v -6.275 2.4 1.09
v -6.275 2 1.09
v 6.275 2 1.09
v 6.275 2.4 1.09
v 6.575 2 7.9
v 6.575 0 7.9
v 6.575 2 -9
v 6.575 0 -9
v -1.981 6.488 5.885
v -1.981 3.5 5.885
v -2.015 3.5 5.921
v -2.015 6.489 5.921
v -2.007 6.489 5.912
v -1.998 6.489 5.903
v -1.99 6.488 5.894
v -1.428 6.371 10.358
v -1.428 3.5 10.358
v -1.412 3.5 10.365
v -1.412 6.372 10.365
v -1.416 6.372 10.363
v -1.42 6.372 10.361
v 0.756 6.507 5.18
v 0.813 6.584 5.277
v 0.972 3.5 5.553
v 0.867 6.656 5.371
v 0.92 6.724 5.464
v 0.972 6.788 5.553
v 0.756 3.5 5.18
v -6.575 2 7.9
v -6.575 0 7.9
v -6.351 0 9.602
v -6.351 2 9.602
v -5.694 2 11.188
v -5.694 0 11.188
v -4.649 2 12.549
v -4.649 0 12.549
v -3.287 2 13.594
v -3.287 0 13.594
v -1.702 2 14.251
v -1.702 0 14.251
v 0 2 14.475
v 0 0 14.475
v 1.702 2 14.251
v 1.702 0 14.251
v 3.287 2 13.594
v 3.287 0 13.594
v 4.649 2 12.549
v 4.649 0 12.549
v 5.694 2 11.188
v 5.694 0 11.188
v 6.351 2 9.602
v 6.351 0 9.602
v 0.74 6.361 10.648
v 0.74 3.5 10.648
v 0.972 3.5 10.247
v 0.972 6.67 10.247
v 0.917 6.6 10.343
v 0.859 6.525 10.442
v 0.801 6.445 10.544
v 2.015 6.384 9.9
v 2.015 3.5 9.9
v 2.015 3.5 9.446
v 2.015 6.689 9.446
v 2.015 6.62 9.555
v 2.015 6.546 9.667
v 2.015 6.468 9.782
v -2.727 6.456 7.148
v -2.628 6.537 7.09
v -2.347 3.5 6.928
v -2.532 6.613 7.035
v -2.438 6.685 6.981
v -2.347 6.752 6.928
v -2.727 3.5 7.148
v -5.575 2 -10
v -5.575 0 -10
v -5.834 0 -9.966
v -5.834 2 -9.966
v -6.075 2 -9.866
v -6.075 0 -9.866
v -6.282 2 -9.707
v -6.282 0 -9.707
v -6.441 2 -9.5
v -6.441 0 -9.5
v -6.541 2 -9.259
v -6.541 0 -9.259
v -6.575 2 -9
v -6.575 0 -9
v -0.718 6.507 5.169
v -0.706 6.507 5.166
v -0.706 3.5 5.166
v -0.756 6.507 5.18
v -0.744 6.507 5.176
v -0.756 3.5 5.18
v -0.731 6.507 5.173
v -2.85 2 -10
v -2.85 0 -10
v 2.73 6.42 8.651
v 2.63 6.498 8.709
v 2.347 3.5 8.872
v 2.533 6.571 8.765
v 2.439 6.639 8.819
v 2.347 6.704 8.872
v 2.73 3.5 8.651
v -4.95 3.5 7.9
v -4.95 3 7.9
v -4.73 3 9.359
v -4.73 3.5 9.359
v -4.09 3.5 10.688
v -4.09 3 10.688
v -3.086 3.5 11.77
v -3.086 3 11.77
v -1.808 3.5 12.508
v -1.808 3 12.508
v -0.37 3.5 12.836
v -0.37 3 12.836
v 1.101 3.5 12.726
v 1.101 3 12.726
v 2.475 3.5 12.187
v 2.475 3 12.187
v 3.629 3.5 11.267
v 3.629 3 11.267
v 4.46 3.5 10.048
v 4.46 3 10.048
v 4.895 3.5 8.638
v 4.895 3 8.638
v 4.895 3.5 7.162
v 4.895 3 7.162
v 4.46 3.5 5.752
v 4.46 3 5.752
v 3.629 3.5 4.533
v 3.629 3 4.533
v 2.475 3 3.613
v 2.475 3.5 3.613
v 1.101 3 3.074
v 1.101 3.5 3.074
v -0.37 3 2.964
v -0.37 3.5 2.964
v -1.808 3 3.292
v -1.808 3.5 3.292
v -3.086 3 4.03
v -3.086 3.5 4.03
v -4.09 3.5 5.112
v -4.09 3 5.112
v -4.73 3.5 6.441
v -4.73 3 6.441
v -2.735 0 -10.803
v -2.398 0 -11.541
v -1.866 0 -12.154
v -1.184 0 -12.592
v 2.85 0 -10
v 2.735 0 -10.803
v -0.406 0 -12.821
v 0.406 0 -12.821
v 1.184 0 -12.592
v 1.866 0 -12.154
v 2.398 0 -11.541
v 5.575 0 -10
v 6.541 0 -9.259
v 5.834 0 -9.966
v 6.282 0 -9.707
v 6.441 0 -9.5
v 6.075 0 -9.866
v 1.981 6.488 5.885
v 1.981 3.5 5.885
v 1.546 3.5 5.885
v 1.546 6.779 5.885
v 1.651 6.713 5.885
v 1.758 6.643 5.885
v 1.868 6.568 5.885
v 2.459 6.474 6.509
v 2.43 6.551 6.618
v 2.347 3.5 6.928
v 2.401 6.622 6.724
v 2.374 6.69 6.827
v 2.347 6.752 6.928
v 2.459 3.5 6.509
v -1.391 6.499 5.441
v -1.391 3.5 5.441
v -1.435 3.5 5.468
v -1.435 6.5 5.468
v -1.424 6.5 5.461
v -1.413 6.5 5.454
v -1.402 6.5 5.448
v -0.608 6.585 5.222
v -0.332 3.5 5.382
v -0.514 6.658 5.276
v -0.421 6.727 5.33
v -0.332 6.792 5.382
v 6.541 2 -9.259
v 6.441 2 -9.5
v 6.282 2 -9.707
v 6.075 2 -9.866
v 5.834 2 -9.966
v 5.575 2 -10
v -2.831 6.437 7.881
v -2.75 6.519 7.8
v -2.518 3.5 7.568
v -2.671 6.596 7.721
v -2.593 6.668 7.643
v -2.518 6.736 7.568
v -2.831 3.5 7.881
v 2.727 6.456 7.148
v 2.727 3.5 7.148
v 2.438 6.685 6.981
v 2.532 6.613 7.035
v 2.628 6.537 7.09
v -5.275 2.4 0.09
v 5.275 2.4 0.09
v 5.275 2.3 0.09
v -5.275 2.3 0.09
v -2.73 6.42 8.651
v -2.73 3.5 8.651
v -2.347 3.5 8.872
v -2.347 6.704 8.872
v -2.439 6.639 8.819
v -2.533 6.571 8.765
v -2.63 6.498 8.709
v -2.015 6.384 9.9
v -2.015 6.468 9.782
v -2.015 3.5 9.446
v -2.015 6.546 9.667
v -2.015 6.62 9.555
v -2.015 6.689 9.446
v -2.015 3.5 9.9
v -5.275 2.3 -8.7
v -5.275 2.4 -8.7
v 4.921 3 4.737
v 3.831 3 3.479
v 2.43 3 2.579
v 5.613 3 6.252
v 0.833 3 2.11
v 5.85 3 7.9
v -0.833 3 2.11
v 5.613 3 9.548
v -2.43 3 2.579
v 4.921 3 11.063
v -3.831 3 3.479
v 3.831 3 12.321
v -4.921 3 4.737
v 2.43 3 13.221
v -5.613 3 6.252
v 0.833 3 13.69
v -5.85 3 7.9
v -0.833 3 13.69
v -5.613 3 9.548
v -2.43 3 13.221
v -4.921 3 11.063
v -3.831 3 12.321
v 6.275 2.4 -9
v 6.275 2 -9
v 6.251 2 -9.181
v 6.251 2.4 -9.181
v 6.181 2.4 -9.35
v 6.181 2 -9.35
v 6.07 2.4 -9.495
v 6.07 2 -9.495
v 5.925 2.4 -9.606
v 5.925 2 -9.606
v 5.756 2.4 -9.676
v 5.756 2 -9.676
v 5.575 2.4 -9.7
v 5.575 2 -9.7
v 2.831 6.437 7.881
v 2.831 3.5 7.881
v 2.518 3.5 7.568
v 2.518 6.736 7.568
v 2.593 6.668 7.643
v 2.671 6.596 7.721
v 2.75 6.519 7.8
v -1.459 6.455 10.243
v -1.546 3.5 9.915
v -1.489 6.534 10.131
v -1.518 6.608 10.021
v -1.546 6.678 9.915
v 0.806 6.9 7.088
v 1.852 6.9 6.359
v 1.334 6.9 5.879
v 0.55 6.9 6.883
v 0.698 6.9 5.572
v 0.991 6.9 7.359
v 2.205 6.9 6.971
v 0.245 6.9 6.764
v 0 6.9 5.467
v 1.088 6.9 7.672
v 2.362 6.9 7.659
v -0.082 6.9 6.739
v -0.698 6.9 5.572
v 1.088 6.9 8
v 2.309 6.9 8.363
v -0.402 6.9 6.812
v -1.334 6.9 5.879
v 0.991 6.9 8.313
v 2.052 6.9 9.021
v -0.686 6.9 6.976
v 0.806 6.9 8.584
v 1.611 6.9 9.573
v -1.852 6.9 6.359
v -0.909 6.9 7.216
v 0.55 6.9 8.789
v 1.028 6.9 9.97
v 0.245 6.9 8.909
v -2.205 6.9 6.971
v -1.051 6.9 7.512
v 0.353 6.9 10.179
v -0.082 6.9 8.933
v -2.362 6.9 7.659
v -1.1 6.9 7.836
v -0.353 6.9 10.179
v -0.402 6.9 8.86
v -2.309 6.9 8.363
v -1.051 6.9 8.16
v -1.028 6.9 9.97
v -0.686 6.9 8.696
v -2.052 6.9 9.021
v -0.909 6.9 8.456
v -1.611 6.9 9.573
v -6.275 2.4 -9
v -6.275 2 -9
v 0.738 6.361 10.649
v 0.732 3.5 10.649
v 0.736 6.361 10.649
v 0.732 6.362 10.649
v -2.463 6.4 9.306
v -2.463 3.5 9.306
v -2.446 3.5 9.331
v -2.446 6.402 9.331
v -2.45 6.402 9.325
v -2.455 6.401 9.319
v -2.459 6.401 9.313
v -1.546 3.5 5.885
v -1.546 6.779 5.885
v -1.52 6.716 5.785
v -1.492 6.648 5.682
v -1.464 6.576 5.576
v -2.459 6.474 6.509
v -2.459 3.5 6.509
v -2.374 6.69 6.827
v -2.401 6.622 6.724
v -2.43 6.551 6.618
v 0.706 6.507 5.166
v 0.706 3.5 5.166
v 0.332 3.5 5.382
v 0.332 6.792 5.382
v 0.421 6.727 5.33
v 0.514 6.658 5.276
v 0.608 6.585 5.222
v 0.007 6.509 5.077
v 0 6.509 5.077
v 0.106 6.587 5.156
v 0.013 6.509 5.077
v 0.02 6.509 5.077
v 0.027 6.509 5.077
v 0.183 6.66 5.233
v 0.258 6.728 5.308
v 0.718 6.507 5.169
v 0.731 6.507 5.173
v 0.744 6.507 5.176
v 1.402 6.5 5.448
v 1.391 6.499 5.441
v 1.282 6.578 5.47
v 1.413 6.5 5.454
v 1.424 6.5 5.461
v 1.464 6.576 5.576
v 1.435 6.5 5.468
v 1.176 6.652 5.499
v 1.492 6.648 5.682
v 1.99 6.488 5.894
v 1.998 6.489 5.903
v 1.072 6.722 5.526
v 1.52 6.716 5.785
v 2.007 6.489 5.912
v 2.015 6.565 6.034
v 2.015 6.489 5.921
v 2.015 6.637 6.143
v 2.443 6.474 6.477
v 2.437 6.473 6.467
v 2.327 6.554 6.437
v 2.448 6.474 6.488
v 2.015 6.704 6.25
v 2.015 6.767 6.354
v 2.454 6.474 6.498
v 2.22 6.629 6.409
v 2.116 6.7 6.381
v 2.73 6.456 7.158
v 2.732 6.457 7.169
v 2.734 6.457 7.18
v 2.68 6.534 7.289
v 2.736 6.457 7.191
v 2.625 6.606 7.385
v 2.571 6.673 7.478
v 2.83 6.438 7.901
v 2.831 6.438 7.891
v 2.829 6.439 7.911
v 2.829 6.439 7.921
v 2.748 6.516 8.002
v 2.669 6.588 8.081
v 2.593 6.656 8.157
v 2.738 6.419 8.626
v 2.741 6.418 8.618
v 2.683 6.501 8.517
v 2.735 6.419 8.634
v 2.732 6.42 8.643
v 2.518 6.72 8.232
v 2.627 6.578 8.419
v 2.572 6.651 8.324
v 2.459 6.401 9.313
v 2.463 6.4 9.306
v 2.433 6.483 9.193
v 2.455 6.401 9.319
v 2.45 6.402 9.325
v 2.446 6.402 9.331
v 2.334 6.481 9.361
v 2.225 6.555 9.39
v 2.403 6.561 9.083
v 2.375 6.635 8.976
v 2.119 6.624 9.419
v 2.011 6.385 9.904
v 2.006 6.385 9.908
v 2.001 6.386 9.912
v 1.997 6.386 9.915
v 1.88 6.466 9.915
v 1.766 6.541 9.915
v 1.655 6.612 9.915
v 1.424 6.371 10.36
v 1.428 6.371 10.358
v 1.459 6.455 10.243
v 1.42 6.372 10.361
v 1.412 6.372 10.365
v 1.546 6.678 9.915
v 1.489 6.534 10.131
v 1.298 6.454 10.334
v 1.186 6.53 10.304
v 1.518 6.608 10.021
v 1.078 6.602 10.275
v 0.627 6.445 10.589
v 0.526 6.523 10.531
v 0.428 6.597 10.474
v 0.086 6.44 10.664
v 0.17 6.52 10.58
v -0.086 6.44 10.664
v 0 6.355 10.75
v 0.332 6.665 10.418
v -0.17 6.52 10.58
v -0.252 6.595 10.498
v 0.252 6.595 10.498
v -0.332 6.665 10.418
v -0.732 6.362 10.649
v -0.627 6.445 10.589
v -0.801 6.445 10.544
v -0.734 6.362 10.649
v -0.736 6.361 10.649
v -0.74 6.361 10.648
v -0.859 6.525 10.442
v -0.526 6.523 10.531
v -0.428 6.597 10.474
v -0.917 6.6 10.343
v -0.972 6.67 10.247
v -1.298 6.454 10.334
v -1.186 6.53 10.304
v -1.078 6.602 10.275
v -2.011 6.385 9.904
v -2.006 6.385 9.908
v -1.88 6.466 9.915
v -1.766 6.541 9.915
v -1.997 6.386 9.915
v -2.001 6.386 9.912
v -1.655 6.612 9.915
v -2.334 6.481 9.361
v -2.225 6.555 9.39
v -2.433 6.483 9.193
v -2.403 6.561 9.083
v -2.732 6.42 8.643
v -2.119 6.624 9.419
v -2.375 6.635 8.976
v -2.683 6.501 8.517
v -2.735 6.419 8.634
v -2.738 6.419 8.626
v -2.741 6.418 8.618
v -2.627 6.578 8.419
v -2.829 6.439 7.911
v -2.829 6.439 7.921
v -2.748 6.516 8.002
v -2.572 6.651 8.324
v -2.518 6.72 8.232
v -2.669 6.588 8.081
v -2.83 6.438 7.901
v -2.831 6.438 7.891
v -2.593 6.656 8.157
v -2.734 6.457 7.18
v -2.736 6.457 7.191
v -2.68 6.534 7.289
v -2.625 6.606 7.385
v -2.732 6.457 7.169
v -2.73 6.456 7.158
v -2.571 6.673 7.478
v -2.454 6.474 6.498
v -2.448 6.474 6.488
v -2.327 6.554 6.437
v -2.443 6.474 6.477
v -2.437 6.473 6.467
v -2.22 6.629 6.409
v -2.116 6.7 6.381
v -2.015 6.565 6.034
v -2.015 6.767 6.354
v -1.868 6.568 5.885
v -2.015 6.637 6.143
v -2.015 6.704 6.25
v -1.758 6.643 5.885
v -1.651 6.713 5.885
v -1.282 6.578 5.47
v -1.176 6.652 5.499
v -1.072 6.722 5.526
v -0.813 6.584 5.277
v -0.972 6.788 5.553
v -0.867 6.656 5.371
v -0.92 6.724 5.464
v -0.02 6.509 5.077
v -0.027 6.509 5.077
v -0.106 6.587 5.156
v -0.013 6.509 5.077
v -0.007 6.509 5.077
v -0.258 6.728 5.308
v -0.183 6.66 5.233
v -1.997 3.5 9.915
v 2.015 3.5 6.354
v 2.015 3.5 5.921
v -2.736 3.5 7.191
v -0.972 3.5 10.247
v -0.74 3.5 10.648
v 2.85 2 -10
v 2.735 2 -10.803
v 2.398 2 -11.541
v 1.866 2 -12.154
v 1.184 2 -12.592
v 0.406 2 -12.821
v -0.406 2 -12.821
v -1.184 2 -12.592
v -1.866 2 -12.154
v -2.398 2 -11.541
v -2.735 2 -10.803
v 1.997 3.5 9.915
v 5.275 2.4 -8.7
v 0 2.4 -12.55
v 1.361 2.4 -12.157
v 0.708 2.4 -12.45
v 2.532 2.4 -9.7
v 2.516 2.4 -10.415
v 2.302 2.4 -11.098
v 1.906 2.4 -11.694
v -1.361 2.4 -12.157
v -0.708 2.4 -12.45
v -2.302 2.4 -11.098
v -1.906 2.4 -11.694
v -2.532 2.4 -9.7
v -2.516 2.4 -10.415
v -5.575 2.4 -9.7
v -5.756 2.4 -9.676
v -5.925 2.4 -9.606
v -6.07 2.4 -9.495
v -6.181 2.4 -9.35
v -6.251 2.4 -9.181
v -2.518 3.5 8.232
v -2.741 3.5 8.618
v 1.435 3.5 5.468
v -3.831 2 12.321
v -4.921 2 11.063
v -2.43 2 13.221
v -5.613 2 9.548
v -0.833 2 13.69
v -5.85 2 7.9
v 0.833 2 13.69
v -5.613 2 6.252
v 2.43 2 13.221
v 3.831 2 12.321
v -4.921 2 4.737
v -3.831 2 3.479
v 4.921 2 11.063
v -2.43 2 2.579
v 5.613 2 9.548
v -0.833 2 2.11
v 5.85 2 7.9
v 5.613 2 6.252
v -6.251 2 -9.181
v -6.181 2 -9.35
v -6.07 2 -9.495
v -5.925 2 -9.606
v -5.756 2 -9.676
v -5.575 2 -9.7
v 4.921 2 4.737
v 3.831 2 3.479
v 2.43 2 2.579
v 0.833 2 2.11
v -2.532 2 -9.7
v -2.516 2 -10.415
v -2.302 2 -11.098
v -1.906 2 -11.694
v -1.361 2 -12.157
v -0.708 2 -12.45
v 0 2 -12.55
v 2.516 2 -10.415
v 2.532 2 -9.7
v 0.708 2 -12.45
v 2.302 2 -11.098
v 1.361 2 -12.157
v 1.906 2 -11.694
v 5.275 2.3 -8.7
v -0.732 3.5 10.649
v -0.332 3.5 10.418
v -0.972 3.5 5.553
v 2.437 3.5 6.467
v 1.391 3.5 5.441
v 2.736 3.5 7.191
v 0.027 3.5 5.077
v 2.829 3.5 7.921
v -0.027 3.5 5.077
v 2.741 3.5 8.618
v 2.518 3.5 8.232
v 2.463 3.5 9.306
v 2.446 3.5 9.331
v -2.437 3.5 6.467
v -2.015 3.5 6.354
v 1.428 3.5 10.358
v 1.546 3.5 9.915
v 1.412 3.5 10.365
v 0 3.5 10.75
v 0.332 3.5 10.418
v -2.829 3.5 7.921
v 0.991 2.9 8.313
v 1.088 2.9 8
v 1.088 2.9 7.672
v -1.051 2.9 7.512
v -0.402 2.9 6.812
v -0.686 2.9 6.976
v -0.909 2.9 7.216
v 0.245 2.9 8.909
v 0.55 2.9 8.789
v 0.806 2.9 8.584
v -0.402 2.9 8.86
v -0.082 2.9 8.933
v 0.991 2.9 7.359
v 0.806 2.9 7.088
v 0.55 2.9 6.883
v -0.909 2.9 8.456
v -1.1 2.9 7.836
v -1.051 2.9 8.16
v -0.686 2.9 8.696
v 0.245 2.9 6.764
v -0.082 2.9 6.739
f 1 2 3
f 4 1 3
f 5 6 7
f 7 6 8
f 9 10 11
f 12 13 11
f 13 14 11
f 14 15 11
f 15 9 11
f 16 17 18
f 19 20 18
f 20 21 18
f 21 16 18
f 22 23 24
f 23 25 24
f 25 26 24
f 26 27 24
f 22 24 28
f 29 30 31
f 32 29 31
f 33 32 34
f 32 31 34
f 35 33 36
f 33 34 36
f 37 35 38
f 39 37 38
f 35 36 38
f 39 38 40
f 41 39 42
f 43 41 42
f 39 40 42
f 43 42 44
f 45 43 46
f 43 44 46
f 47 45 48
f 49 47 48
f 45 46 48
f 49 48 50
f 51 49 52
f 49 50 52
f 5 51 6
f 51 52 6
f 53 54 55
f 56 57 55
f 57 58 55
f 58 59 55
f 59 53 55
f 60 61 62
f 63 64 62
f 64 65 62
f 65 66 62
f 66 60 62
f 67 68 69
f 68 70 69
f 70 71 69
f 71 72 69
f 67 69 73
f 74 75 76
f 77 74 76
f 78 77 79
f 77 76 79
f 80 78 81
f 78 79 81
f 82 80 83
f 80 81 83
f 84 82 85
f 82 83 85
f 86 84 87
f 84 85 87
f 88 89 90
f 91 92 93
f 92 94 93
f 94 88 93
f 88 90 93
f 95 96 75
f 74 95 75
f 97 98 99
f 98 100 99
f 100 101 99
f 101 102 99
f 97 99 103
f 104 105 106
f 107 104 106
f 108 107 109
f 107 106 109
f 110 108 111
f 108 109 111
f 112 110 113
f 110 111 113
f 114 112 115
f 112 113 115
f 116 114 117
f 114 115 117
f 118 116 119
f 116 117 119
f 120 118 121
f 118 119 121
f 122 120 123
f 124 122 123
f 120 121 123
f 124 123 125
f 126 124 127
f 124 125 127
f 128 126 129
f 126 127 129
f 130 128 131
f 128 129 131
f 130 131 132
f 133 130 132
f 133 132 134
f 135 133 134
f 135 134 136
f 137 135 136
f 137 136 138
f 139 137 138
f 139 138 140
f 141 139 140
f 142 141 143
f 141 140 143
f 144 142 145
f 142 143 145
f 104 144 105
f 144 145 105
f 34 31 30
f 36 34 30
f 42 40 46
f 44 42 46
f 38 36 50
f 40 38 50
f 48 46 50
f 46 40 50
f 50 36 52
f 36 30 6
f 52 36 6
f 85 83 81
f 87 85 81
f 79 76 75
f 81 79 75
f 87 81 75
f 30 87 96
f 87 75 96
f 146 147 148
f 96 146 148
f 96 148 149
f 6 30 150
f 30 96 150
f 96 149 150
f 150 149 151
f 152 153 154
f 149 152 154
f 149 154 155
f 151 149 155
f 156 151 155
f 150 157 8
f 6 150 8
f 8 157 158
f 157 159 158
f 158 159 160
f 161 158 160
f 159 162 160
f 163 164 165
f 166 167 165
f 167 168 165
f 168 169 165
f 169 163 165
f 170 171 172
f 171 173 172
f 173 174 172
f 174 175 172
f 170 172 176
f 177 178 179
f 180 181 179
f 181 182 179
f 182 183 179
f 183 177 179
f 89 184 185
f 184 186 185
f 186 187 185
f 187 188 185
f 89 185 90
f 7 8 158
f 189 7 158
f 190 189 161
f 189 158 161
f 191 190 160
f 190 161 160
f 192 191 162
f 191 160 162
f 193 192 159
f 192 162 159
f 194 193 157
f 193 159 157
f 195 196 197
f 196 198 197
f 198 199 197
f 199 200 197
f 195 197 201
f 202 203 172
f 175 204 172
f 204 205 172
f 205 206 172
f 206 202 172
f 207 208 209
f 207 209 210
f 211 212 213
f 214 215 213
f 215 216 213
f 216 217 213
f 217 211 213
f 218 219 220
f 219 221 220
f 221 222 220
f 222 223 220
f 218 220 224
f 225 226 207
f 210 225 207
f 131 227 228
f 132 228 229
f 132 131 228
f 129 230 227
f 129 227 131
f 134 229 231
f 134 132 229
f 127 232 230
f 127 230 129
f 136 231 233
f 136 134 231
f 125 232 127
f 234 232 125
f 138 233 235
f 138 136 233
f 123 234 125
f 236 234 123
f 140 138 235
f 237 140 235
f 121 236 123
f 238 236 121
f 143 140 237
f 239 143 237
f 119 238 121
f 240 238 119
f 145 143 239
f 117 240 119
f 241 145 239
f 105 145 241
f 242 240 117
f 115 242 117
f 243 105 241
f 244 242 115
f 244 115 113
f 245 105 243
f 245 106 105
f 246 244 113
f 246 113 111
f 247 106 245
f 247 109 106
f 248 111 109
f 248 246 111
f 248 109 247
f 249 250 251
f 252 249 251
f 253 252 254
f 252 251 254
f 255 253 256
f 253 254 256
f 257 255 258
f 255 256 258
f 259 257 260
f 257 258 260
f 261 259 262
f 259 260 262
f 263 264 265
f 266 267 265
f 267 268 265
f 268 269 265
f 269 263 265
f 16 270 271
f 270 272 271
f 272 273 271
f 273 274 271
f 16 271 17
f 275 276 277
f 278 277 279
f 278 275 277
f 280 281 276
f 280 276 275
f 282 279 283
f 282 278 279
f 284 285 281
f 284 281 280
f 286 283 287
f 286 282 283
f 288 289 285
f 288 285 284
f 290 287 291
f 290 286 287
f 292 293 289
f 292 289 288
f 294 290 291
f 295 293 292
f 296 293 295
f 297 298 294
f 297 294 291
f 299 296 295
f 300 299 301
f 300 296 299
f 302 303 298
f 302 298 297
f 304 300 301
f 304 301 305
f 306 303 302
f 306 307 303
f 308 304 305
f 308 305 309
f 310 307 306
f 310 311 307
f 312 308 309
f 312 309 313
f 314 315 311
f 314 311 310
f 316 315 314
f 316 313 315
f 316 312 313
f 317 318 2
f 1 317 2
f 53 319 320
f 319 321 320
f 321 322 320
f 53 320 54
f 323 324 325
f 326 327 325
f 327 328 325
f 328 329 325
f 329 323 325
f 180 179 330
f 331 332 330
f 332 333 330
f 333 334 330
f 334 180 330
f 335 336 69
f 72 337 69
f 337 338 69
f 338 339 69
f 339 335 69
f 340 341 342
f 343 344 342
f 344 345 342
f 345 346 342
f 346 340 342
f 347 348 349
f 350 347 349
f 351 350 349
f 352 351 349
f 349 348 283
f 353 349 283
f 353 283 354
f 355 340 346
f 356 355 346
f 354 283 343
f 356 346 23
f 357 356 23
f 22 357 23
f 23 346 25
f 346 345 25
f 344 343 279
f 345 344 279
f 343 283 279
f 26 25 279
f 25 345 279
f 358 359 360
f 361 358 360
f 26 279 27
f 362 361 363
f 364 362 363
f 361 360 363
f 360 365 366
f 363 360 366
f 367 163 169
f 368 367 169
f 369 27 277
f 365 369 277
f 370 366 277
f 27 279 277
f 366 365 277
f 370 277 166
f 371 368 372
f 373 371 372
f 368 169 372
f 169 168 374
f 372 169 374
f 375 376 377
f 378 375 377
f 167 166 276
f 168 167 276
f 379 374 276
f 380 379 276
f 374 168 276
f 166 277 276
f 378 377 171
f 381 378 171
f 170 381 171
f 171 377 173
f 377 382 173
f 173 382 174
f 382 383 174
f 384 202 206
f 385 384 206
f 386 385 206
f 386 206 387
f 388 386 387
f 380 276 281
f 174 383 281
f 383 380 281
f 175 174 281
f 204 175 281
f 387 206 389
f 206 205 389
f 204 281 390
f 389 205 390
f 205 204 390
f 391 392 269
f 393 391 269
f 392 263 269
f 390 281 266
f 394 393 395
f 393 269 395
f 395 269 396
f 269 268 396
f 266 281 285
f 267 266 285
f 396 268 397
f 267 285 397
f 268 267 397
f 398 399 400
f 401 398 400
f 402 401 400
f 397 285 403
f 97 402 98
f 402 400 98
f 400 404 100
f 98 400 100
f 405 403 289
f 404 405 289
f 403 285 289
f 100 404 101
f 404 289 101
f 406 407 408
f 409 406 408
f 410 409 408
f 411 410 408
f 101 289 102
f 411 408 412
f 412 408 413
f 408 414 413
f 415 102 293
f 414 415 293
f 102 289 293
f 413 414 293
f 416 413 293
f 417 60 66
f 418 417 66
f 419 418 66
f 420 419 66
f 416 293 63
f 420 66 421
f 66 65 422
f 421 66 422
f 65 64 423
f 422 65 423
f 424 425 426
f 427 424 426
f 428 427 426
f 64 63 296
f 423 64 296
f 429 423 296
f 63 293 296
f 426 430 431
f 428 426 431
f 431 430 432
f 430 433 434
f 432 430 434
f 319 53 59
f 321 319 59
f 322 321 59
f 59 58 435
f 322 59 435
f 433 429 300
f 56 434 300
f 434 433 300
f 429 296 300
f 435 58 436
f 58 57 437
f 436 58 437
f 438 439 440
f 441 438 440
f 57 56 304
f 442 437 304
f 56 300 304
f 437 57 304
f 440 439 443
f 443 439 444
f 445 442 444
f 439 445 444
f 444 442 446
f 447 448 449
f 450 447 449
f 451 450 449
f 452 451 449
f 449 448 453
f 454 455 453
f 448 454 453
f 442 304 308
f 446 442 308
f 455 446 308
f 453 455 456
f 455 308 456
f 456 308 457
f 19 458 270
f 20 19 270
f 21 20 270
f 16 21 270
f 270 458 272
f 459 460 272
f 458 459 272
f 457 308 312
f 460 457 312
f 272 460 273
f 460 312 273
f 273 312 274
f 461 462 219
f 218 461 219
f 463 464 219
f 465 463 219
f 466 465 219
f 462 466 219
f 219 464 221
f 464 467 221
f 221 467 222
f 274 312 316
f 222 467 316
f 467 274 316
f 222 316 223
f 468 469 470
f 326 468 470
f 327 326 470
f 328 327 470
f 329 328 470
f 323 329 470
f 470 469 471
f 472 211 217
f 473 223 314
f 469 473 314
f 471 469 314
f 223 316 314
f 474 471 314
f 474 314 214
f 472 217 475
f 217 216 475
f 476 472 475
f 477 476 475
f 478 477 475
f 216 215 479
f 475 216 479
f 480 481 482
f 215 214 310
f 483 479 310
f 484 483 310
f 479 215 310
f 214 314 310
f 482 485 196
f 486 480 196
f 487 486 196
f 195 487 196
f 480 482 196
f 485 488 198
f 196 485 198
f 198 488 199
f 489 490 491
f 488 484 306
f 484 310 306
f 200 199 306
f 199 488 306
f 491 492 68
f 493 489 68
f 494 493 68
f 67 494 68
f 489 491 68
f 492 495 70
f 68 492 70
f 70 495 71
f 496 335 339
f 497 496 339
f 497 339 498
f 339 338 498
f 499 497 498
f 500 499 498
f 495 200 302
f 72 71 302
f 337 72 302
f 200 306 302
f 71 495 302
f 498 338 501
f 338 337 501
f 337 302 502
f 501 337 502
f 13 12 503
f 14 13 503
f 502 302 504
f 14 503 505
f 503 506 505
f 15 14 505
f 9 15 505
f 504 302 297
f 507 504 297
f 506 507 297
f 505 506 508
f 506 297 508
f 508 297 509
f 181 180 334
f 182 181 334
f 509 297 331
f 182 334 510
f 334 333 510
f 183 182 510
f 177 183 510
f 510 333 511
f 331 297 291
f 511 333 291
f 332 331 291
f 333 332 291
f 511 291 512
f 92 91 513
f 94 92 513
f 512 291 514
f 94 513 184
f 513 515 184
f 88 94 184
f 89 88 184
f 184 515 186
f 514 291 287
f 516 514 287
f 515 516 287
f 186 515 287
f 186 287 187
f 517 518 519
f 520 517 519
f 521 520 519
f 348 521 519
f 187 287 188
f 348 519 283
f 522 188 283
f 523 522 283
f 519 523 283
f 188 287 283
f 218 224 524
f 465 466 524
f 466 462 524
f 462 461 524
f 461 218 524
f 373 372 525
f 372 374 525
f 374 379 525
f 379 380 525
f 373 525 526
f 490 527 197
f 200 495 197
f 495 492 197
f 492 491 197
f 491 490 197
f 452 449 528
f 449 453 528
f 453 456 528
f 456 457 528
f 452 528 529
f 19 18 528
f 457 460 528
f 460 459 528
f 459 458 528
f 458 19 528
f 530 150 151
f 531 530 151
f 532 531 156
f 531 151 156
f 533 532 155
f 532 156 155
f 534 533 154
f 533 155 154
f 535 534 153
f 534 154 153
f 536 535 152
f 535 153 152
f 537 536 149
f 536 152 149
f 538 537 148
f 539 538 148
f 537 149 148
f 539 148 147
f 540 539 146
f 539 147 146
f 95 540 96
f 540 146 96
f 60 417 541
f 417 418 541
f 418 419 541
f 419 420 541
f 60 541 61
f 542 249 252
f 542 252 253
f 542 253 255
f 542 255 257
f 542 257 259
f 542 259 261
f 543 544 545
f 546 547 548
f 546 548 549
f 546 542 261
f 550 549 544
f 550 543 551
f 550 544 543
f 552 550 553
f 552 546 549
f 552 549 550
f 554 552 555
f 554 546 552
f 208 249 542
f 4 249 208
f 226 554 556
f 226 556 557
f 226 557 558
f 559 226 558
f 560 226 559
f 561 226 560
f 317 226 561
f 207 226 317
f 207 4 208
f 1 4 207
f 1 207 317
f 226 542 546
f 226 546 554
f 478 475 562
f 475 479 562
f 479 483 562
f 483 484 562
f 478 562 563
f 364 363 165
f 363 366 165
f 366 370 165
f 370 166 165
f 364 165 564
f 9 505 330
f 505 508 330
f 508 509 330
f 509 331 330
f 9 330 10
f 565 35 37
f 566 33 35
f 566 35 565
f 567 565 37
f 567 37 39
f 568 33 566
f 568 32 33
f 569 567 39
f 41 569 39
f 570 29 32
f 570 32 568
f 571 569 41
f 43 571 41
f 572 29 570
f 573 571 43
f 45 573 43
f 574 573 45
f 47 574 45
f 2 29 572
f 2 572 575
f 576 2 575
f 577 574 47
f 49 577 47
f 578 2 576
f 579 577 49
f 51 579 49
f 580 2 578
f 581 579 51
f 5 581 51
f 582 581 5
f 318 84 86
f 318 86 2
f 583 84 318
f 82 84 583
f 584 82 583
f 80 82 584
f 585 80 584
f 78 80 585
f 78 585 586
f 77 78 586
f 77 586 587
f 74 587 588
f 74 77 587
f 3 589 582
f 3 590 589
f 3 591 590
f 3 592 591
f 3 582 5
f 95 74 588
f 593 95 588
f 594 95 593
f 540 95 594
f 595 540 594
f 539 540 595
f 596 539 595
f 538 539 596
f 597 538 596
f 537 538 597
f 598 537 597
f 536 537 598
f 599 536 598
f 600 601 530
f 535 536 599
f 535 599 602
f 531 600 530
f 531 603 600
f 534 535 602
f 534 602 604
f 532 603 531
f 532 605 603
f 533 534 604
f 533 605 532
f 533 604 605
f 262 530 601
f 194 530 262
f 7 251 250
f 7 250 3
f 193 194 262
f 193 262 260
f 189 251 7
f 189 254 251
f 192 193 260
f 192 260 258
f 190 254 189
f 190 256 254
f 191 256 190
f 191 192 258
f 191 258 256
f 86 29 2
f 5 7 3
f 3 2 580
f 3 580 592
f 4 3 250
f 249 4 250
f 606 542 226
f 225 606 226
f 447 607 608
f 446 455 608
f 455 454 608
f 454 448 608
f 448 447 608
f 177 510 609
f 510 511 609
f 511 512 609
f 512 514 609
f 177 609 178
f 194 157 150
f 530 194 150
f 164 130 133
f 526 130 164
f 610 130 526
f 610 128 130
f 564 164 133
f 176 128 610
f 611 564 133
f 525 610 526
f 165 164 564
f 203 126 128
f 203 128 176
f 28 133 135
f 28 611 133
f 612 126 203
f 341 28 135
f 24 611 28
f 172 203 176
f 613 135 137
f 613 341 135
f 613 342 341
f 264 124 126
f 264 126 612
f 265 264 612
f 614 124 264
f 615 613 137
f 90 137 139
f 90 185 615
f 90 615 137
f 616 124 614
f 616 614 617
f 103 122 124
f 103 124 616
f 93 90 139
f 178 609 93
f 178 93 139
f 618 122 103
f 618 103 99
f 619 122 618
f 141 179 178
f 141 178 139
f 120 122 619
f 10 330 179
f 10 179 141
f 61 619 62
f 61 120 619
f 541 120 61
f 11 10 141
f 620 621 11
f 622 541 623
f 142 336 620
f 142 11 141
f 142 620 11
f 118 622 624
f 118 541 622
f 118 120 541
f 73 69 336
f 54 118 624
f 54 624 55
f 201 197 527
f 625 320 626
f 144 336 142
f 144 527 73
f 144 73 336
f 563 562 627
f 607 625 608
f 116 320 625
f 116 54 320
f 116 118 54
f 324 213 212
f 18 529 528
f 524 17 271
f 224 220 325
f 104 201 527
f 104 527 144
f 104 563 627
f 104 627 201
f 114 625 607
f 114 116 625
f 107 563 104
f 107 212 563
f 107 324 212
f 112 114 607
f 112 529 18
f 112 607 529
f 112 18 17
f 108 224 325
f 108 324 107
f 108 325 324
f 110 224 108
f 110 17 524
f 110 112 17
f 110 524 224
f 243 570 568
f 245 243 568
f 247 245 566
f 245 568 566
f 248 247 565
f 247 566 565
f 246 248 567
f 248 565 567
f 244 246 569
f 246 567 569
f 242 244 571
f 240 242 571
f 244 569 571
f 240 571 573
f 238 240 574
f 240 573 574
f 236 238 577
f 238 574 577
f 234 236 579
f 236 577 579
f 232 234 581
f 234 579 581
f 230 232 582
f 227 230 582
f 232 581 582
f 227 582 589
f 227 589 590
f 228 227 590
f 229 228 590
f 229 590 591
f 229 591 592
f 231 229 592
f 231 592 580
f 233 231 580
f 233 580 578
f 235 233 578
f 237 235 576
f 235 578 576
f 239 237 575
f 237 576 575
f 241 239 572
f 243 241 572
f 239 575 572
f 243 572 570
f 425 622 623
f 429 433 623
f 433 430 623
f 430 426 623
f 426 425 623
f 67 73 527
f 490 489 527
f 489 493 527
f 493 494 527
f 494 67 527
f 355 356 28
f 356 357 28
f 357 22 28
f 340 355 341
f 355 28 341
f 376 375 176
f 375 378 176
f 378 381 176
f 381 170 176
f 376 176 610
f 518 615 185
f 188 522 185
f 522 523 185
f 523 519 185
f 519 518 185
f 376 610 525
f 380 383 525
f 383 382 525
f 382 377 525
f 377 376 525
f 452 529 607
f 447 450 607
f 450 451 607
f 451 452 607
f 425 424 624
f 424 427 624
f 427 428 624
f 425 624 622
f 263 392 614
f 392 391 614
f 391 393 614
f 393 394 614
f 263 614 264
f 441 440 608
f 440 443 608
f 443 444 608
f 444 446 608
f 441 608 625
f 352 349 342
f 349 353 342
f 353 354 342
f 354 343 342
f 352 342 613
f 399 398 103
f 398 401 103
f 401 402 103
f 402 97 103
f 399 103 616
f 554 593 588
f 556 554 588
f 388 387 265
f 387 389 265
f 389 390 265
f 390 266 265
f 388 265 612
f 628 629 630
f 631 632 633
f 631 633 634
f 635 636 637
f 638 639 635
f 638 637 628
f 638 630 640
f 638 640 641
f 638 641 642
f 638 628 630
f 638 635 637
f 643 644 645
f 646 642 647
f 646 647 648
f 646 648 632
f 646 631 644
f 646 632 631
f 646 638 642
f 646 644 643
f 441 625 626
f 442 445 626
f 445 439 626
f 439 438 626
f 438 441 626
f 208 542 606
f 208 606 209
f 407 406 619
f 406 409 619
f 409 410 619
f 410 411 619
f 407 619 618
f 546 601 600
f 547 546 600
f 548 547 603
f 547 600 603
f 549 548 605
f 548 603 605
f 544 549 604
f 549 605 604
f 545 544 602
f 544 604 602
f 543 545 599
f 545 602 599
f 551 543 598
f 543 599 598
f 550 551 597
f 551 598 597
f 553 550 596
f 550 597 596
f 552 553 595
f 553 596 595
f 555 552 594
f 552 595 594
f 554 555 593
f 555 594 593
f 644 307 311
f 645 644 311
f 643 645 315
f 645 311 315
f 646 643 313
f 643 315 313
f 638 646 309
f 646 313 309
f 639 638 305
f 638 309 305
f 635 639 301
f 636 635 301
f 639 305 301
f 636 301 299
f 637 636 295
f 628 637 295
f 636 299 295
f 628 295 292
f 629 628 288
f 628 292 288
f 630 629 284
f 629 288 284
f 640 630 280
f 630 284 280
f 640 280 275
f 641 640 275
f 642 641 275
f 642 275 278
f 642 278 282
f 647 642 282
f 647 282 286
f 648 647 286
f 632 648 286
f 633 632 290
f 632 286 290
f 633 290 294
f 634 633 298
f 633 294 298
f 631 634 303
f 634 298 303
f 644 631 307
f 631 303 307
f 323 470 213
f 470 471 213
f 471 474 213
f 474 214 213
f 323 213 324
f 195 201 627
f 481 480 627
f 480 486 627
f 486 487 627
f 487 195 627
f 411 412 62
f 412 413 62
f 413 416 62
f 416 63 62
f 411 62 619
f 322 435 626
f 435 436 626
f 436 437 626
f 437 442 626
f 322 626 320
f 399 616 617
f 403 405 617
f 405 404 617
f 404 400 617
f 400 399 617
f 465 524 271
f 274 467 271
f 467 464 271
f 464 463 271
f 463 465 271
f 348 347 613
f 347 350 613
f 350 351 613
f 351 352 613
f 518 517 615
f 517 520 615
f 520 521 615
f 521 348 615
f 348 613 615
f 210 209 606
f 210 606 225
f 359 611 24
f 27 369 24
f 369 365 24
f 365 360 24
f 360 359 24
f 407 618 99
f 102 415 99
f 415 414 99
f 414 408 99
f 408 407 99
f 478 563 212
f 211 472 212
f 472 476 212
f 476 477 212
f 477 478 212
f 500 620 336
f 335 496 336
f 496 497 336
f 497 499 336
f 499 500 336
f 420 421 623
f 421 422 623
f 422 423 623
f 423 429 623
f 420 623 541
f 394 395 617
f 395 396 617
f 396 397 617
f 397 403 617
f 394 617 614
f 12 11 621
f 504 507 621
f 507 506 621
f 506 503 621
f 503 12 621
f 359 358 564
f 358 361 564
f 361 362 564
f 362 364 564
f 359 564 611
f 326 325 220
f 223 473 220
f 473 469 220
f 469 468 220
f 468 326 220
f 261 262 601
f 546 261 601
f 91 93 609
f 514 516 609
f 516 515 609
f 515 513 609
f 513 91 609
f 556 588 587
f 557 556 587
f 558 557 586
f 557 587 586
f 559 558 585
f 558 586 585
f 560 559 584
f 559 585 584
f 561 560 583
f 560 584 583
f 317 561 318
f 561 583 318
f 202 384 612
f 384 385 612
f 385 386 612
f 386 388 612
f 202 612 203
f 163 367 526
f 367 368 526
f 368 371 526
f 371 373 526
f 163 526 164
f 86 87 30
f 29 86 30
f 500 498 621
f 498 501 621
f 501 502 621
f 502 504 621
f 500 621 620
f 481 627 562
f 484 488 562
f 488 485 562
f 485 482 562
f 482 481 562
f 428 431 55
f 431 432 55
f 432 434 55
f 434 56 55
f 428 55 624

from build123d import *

# Parameters (mm, degrees)
SKETCH1_R           = 6.575
SKETCH1_R_2         = 1
BOSS_EXTRUDE1_DEPTH = 2
SKETCH2_R           = 5.85
BOSS_EXTRUDE2_DEPTH = 1
SKETCH3_R           = 4.95
BOSS_EXTRUDE3_DEPTH = 0.5
BOSS_EXTRUDE4_DEPTH = 3.4
SKETCH6_R           = 1.1
CUT_EXTRUDE1_DEPTH  = 4
BOSS_EXTRUDE5_DEPTH = 0.4
SKETCH8_W           = 10.55
SKETCH8_H           = 8.790176683
CUT_EXTRUDE2_DEPTH  = 0.1


with BuildPart() as part:
    # Sketch1 → Boss-Extrude1 (new body)
    with BuildSketch(Plane(origin=(0, 0, 0), x_dir=(1, 0, 0), z_dir=(0, 1, 0))):
        with Locations((0, -7.9)):
            Circle(SKETCH1_R)
        with BuildLine():
            Line((-2.85, 10), (-5.575, 10))
            ThreePointArc((-5.575, 10), (-4.867893219, 9.707106781), (-4.575, 9))
            ThreePointArc((-4.575, 9), (-5.574999999, 8), (-6.575, 8.999999999))
            Line((-6.575, 8.999999999), (-6.575, -7.9))
            ThreePointArc((-6.575, -7.9), (0, -1.325), (6.575, -7.9))
            Line((6.575, -7.9), (6.575, 9))
            ThreePointArc((6.575, 9), (4.867893224, 8.292893214), (5.574999986, 10))
            Line((5.574999986, 10), (2.85, 10))
            ThreePointArc((2.85, 10), (0, 7.15), (-2.85, 10))
        make_face()
        with Locations((-5.575, 9)):
            Circle(SKETCH1_R_2)
        with BuildLine():
            ThreePointArc((2.85, 10), (0, 12.85), (-2.85, 10))
            Line((-2.85, 10), (2.85, 10))
        make_face()
        with BuildLine():
            Line((2.85, 10), (-2.85, 10))
            ThreePointArc((-2.85, 10), (0, 7.15), (2.85, 10))
        make_face()
        with Locations((5.575, 9)):
            Circle(SKETCH1_R_2)
    extrude(amount=BOSS_EXTRUDE1_DEPTH)

    # Sketch2 → Boss-Extrude2 (add)
    with BuildSketch(Plane(origin=(0, 2, 0), x_dir=(-1, 0, 0), z_dir=(0, 1, 0))):
        with Locations((0, 7.9)):
            Circle(SKETCH2_R)
    extrude(amount=BOSS_EXTRUDE2_DEPTH)

    # Sketch3 → Boss-Extrude3 (add)
    with BuildSketch(Plane(origin=(0, 3, 0), x_dir=(-1, 0, 0), z_dir=(0, 1, 0))):
        with Locations((0, 7.9)):
            Circle(SKETCH3_R)
    extrude(amount=BOSS_EXTRUDE3_DEPTH)

    # Sketch4 → Boss-Extrude4 (add)
    with BuildSketch(Plane(origin=(0, 3.5, 0), x_dir=(-1, 0, 0), z_dir=(0, 1, 0))):
        Polygon((2.736417755, 7.190894071), (2.518440958, 7.568440958), (2.831329546, 7.881329546), (2.828587818, 7.921412182), (2.518440958, 8.231559042), (2.741390732, 8.617719379), (2.729517437, 8.651127629), (2.346813369, 8.872081926), (2.463209043, 9.306476495), (2.445926072, 9.330960886), (2.015254326, 9.446359032), (2.015254326, 9.900296057), (1.996868143, 9.915254326), (1.546359032, 9.915254326), (1.427678707, 10.35817533), (1.412422166, 10.36480218), (0.972081926, 10.246813369), (0.740314632, 10.648246096), (0.731654815, 10.64943636), (0.331559042, 10.418440958), (0, 10.75), (-0.331559042, 10.418440958), (-0.731654815, 10.64943636), (-0.740314632, 10.648246096), (-0.972081926, 10.246813369), (-1.412422166, 10.36480218), (-1.427678707, 10.35817533), (-1.546359032, 9.915254326), (-1.996868143, 9.915254326), (-2.015254326, 9.900296057), (-2.015254326, 9.446359032), (-2.445926072, 9.330960886), (-2.463209043, 9.306476495), (-2.346813369, 8.872081926), (-2.729517437, 8.651127629), (-2.741390732, 8.617719379), (-2.518440958, 8.231559042), (-2.828587818, 7.921412182), (-2.831329546, 7.881329546), (-2.518440958, 7.568440958), (-2.736417755, 7.190894071), (-2.727435802, 7.147670539), (-2.346813369, 6.927918074), (-2.459115706, 6.508800044), (-2.437318125, 6.466732622), (-2.015254326, 6.353640968), (-2.015254326, 5.921202275), (-1.981206238, 5.884745674), (-1.546359032, 5.884745674), (-1.434668452, 5.467910755), (-1.390523426, 5.441065569), (-0.972081926, 5.553186631), (-0.756489757, 5.179770042), (-0.705710775, 5.165542438), (-0.331559042, 5.381559042), (-0.026545054, 5.076545054), (0.026545054, 5.076545054), (0.331559042, 5.381559042), (0.705710775, 5.165542438), (0.756489757, 5.179770042), (0.972081926, 5.553186631), (1.390523426, 5.441065569), (1.434668452, 5.467910755), (1.546359032, 5.884745674), (1.981206238, 5.884745674), (2.015254326, 5.921202275), (2.015254326, 6.353640968), (2.437318125, 6.466732622), (2.459115706, 6.508800044), (2.346813369, 6.927918074), (2.727435802, 7.147670539), align=None)
    extrude(amount=BOSS_EXTRUDE4_DEPTH)

    # Sketch5 → Cut-Revolve1 (revolve, cut)
    with BuildSketch(Plane(origin=(0, 0, 0), x_dir=(0, 0, -1), z_dir=(1, 0, 0))):
        Polygon((-5.867221225, 7.3), (-4.517199782, 7.3), (-4.517199782, 5.949978558), align=None)
    revolve(axis=Axis((0, 8.077813164, 7.836091173), (0, -1, 0)), mode=Mode.SUBTRACT)

    # Sketch6 → Cut-Extrude1 (cut)
    with BuildSketch(Plane(origin=(0, 6.9, 0), x_dir=(-1, 0, 0), z_dir=(0, 1, 0))):
        with Locations((0, 7.836091173)):
            Circle(SKETCH6_R)
    extrude(amount=-CUT_EXTRUDE1_DEPTH, mode=Mode.SUBTRACT)

    # Sketch7 → Boss-Extrude5 (add)
    with BuildSketch(Plane(origin=(0, 2, 0), x_dir=(-1, 0, 0), z_dir=(0, 1, 0))):
        with BuildLine():
            Line((2.532291452, -9.7), (5.575, -9.7))
            ThreePointArc((5.575, -9.7), (6.069974747, -9.494974747), (6.275, -9))
            Line((6.275, -9), (6.275, 1.090176683))
            Line((6.275, 1.090176683), (-6.275, 1.090176683))
            Line((-6.275, 1.090176683), (-6.275, -1.654552581))
            Line((-6.275, -1.654552581), (-6.275, -9))
            ThreePointArc((-6.275, -9), (-6.069974747, -9.494974747), (-5.575, -9.7))
            Line((-5.575, -9.7), (-2.532291452, -9.7))
            ThreePointArc((-2.532291452, -9.7), (0, -12.55), (2.532291452, -9.7))
        make_face()
    extrude(amount=BOSS_EXTRUDE5_DEPTH)

    # Sketch8 → Cut-Extrude2 (cut)
    with BuildSketch(Plane(origin=(0, 2.4, 0), x_dir=(-1, 0, 0), z_dir=(0, 1, 0))):
        with Locations((0, -4.304911659)):
            Rectangle(SKETCH8_W, SKETCH8_H)
    extrude(amount=-CUT_EXTRUDE2_DEPTH, mode=Mode.SUBTRACT)


solid = part.part
